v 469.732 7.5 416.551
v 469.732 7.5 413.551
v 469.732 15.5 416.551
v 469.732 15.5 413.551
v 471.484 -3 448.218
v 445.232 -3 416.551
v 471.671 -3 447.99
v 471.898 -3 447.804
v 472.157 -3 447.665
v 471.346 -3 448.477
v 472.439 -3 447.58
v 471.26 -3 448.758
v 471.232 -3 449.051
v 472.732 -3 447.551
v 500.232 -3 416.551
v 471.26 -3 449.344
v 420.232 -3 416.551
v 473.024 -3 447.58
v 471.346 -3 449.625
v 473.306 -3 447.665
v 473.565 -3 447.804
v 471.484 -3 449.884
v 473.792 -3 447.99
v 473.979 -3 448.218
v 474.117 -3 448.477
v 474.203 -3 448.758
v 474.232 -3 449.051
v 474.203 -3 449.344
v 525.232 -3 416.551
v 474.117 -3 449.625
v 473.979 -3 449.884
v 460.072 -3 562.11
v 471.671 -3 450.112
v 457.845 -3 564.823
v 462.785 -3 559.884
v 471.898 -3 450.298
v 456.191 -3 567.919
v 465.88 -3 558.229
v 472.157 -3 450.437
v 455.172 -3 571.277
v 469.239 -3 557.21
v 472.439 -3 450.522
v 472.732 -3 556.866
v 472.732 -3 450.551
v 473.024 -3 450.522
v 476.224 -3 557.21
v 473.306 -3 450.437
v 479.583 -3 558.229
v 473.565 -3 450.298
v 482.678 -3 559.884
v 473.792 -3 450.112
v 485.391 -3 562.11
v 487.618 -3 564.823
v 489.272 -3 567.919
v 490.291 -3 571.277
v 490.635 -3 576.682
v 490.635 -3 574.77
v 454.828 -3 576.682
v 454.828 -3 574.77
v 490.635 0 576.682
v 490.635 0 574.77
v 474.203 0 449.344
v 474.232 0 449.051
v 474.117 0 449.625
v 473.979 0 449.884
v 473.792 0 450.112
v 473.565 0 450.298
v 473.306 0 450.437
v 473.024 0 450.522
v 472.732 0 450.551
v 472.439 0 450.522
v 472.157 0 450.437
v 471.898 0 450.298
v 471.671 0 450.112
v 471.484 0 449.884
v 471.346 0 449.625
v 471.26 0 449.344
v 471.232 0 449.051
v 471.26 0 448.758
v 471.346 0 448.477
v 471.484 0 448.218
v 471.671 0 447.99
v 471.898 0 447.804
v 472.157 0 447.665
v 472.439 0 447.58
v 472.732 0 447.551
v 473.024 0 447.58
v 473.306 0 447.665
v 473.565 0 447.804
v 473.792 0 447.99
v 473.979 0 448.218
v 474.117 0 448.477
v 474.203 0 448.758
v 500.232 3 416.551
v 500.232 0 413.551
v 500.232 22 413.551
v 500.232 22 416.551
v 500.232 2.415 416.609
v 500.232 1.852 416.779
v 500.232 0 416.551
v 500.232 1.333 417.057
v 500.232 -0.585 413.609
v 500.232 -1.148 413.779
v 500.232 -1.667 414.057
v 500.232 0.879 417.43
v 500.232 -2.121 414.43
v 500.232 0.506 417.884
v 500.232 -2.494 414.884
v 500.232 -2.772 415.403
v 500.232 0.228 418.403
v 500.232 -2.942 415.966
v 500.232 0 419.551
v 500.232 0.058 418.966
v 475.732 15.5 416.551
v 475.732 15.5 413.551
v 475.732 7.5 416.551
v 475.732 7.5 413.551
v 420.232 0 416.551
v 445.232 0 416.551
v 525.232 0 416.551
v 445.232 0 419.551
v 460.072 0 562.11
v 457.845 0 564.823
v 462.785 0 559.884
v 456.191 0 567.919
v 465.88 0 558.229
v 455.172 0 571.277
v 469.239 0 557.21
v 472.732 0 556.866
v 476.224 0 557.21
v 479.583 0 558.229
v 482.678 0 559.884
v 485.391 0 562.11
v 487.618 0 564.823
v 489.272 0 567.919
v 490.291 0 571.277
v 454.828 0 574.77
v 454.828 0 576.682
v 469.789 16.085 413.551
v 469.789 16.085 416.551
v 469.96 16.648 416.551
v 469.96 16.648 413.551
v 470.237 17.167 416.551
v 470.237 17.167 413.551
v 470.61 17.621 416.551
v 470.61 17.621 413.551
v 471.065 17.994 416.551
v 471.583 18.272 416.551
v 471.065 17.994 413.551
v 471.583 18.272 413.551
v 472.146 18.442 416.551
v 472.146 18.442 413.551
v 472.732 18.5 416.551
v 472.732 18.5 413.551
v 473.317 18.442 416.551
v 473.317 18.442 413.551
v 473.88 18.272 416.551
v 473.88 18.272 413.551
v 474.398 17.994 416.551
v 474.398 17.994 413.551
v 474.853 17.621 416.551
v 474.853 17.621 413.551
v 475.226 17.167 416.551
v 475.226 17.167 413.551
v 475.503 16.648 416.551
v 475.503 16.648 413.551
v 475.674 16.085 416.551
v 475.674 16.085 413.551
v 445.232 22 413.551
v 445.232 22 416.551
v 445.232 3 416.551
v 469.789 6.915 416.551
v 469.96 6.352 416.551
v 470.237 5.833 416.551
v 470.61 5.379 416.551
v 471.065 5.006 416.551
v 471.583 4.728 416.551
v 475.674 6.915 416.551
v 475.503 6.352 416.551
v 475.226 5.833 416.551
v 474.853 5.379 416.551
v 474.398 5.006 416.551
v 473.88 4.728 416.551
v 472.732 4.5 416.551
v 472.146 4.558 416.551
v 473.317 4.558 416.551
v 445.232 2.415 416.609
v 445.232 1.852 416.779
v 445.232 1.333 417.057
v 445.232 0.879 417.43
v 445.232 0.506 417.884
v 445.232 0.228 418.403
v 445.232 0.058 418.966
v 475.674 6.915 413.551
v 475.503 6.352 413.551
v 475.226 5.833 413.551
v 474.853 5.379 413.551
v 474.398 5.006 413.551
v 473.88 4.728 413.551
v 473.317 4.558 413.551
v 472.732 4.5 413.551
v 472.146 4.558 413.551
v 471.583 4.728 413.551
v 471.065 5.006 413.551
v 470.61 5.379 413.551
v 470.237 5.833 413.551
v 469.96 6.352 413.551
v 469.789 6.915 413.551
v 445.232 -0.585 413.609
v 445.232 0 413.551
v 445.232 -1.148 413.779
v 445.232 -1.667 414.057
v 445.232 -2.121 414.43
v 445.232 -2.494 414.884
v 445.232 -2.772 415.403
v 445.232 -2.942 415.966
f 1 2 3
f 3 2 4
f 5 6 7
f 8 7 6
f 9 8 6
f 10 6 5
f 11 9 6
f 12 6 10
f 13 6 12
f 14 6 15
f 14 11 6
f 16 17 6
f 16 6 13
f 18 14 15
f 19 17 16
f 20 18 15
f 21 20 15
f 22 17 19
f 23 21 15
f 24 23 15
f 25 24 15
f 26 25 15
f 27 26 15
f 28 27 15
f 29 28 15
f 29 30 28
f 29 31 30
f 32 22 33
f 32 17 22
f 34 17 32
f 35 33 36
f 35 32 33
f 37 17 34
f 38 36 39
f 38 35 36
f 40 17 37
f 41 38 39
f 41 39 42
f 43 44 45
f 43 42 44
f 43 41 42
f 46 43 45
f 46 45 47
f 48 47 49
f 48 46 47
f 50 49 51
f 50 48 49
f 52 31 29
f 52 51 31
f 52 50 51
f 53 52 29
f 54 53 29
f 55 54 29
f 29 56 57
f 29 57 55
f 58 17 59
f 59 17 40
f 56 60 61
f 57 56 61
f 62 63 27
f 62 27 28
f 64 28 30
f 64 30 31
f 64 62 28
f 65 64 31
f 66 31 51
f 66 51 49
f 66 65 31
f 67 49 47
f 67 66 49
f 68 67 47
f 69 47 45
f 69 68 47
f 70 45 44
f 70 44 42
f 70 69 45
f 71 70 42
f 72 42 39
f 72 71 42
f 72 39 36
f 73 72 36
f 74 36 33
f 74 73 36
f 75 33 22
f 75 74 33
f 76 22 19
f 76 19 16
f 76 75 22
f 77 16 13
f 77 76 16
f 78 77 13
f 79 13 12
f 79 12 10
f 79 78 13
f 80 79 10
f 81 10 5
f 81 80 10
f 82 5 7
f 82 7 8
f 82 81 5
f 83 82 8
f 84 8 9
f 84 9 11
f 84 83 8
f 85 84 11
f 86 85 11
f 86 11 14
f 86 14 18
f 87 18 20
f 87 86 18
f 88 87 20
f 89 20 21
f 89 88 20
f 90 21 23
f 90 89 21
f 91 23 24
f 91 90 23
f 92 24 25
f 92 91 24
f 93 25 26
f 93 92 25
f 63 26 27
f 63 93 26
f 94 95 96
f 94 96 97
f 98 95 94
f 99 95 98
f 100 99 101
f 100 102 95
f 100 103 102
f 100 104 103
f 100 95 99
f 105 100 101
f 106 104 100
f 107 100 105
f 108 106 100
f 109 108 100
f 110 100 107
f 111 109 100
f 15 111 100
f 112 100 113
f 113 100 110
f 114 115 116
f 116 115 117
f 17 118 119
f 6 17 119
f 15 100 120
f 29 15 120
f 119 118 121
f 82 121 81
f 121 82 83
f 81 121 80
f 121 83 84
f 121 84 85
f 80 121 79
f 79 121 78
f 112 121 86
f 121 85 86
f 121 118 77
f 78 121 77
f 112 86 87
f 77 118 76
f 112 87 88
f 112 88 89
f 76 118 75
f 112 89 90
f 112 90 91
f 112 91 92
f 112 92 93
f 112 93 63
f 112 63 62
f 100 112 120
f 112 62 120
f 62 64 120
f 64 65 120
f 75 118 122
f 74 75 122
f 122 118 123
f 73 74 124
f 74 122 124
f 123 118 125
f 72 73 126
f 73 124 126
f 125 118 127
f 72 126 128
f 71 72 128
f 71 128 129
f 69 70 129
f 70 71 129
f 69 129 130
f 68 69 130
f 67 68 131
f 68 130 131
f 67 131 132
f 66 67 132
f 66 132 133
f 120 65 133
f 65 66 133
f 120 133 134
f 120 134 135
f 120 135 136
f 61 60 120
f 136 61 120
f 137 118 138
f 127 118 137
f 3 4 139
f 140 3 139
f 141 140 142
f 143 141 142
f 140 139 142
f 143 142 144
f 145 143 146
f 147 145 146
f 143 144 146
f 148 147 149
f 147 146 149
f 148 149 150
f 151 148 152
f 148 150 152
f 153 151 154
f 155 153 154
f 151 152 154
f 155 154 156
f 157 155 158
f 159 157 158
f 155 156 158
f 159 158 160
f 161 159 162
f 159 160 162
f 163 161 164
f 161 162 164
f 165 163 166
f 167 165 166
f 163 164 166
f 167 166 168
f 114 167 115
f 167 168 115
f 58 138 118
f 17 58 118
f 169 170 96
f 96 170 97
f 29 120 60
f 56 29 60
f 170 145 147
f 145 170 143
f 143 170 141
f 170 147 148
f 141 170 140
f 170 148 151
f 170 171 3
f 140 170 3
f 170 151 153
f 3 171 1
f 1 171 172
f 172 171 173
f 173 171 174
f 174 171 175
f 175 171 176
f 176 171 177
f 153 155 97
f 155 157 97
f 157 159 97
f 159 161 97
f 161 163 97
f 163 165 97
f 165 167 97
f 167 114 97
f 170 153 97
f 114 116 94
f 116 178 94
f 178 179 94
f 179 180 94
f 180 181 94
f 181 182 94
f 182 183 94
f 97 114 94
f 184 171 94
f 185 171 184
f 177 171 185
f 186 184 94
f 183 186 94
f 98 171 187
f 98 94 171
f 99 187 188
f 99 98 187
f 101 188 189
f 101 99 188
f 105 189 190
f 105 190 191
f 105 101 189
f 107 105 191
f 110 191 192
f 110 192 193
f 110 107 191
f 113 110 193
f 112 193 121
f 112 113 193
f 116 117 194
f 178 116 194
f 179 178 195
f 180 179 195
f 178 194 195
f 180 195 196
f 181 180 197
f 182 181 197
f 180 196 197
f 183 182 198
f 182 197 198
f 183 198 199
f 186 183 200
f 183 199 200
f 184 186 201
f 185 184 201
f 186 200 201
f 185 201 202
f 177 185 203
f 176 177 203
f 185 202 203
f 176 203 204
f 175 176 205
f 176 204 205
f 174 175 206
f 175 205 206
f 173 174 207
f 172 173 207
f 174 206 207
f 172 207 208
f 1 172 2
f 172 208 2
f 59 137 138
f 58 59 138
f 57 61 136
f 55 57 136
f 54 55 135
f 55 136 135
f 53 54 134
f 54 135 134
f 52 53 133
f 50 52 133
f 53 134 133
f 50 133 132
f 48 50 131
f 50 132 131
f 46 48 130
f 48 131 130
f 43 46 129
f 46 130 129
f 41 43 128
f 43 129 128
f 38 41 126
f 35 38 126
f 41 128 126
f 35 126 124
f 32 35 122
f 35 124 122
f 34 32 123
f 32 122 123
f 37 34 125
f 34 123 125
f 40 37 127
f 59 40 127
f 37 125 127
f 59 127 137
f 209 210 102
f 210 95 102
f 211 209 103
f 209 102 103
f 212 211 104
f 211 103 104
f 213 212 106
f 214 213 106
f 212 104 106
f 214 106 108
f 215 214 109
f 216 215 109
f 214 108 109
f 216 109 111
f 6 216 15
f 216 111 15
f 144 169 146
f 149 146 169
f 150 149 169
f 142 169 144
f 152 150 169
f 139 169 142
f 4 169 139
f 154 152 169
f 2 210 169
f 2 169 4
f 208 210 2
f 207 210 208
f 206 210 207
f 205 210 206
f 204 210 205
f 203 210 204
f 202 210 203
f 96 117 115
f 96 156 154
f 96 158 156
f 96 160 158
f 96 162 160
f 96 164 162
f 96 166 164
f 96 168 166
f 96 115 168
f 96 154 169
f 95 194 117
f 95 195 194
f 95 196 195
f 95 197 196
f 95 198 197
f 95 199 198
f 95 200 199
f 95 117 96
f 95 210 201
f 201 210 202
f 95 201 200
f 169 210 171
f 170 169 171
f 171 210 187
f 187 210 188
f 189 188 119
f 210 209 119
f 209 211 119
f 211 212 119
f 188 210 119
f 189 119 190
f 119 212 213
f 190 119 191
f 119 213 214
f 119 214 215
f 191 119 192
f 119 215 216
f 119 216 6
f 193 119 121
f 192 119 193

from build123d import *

# Parameters (mm, degrees)
F0_R     = 1.5
F1_DEPTH = 3
F2_W     = 55
F2_H     = 3
F3_DEPTH = 25
F4_R     = 3
F6_DEPTH = 163.1321276775


with BuildPart() as f1:
    # F0 (on Front) → F1 (new body)
    with BuildSketch(Plane.XZ):
        with BuildLine():
            Line((454.8277321524, 574.7700988736), (454.8277321524, 576.6820907487))
            Line((454.8277321524, 576.6820907487), (420.231500864, 416.5509630712))
            Line((420.231500864, 416.5509630712), (495.9500458773, 416.5509630712))
            Line((495.9500458773, 416.5509630712), (525.231500864, 416.5509630712))
            Line((525.231500864, 416.5509630712), (490.6352695757, 576.6820907487))
            Line((490.6352695757, 576.6820907487), (490.6352695757, 574.7700988736))
            ThreePointArc((490.6352695757, 574.7700988736), (472.731500864, 556.866330162), (454.8277321524, 574.7700988736))
        make_face()
        with Locations((472.731500864, 449.0509630712)):
            Circle(F0_R, mode=Mode.SUBTRACT)
    extrude(amount=F1_DEPTH)

    # F2 (on face) → F3 (join)
    with BuildSketch(Plane.XZ.offset(3)):
        with Locations((472.731500864, 415.0509630712)):
            Rectangle(F2_W, F2_H)
    extrude(amount=-F3_DEPTH)

    # F4
    f4_edges = [f1.edges().sort_by_distance(p)[0] for p in [
        (472.731501, -3, 413.550963),
        (472.731501, 0, 416.550963),
    ]]
    fillet(f4_edges, radius=F4_R)

    # F5 (on face) → F6 (cut, through all)
    with BuildSketch(Plane(origin=(0, 0, 413.5509630712), x_dir=(1, 0, 0), z_dir=(0, 0, -1))):
        with BuildLine():
            Line((475.731500864, -15.5), (475.731500864, -7.5))
            ThreePointArc((475.731500864, -7.5), (472.731500864, -4.5), (469.731500864, -7.5))
            Line((469.731500864, -7.5), (469.731500864, -15.5))
            ThreePointArc((469.731500864, -15.5), (472.731500864, -18.5), (475.731500864, -15.5))
        make_face()
    extrude(amount=-F6_DEPTH, mode=Mode.SUBTRACT)


solid = f1.part
